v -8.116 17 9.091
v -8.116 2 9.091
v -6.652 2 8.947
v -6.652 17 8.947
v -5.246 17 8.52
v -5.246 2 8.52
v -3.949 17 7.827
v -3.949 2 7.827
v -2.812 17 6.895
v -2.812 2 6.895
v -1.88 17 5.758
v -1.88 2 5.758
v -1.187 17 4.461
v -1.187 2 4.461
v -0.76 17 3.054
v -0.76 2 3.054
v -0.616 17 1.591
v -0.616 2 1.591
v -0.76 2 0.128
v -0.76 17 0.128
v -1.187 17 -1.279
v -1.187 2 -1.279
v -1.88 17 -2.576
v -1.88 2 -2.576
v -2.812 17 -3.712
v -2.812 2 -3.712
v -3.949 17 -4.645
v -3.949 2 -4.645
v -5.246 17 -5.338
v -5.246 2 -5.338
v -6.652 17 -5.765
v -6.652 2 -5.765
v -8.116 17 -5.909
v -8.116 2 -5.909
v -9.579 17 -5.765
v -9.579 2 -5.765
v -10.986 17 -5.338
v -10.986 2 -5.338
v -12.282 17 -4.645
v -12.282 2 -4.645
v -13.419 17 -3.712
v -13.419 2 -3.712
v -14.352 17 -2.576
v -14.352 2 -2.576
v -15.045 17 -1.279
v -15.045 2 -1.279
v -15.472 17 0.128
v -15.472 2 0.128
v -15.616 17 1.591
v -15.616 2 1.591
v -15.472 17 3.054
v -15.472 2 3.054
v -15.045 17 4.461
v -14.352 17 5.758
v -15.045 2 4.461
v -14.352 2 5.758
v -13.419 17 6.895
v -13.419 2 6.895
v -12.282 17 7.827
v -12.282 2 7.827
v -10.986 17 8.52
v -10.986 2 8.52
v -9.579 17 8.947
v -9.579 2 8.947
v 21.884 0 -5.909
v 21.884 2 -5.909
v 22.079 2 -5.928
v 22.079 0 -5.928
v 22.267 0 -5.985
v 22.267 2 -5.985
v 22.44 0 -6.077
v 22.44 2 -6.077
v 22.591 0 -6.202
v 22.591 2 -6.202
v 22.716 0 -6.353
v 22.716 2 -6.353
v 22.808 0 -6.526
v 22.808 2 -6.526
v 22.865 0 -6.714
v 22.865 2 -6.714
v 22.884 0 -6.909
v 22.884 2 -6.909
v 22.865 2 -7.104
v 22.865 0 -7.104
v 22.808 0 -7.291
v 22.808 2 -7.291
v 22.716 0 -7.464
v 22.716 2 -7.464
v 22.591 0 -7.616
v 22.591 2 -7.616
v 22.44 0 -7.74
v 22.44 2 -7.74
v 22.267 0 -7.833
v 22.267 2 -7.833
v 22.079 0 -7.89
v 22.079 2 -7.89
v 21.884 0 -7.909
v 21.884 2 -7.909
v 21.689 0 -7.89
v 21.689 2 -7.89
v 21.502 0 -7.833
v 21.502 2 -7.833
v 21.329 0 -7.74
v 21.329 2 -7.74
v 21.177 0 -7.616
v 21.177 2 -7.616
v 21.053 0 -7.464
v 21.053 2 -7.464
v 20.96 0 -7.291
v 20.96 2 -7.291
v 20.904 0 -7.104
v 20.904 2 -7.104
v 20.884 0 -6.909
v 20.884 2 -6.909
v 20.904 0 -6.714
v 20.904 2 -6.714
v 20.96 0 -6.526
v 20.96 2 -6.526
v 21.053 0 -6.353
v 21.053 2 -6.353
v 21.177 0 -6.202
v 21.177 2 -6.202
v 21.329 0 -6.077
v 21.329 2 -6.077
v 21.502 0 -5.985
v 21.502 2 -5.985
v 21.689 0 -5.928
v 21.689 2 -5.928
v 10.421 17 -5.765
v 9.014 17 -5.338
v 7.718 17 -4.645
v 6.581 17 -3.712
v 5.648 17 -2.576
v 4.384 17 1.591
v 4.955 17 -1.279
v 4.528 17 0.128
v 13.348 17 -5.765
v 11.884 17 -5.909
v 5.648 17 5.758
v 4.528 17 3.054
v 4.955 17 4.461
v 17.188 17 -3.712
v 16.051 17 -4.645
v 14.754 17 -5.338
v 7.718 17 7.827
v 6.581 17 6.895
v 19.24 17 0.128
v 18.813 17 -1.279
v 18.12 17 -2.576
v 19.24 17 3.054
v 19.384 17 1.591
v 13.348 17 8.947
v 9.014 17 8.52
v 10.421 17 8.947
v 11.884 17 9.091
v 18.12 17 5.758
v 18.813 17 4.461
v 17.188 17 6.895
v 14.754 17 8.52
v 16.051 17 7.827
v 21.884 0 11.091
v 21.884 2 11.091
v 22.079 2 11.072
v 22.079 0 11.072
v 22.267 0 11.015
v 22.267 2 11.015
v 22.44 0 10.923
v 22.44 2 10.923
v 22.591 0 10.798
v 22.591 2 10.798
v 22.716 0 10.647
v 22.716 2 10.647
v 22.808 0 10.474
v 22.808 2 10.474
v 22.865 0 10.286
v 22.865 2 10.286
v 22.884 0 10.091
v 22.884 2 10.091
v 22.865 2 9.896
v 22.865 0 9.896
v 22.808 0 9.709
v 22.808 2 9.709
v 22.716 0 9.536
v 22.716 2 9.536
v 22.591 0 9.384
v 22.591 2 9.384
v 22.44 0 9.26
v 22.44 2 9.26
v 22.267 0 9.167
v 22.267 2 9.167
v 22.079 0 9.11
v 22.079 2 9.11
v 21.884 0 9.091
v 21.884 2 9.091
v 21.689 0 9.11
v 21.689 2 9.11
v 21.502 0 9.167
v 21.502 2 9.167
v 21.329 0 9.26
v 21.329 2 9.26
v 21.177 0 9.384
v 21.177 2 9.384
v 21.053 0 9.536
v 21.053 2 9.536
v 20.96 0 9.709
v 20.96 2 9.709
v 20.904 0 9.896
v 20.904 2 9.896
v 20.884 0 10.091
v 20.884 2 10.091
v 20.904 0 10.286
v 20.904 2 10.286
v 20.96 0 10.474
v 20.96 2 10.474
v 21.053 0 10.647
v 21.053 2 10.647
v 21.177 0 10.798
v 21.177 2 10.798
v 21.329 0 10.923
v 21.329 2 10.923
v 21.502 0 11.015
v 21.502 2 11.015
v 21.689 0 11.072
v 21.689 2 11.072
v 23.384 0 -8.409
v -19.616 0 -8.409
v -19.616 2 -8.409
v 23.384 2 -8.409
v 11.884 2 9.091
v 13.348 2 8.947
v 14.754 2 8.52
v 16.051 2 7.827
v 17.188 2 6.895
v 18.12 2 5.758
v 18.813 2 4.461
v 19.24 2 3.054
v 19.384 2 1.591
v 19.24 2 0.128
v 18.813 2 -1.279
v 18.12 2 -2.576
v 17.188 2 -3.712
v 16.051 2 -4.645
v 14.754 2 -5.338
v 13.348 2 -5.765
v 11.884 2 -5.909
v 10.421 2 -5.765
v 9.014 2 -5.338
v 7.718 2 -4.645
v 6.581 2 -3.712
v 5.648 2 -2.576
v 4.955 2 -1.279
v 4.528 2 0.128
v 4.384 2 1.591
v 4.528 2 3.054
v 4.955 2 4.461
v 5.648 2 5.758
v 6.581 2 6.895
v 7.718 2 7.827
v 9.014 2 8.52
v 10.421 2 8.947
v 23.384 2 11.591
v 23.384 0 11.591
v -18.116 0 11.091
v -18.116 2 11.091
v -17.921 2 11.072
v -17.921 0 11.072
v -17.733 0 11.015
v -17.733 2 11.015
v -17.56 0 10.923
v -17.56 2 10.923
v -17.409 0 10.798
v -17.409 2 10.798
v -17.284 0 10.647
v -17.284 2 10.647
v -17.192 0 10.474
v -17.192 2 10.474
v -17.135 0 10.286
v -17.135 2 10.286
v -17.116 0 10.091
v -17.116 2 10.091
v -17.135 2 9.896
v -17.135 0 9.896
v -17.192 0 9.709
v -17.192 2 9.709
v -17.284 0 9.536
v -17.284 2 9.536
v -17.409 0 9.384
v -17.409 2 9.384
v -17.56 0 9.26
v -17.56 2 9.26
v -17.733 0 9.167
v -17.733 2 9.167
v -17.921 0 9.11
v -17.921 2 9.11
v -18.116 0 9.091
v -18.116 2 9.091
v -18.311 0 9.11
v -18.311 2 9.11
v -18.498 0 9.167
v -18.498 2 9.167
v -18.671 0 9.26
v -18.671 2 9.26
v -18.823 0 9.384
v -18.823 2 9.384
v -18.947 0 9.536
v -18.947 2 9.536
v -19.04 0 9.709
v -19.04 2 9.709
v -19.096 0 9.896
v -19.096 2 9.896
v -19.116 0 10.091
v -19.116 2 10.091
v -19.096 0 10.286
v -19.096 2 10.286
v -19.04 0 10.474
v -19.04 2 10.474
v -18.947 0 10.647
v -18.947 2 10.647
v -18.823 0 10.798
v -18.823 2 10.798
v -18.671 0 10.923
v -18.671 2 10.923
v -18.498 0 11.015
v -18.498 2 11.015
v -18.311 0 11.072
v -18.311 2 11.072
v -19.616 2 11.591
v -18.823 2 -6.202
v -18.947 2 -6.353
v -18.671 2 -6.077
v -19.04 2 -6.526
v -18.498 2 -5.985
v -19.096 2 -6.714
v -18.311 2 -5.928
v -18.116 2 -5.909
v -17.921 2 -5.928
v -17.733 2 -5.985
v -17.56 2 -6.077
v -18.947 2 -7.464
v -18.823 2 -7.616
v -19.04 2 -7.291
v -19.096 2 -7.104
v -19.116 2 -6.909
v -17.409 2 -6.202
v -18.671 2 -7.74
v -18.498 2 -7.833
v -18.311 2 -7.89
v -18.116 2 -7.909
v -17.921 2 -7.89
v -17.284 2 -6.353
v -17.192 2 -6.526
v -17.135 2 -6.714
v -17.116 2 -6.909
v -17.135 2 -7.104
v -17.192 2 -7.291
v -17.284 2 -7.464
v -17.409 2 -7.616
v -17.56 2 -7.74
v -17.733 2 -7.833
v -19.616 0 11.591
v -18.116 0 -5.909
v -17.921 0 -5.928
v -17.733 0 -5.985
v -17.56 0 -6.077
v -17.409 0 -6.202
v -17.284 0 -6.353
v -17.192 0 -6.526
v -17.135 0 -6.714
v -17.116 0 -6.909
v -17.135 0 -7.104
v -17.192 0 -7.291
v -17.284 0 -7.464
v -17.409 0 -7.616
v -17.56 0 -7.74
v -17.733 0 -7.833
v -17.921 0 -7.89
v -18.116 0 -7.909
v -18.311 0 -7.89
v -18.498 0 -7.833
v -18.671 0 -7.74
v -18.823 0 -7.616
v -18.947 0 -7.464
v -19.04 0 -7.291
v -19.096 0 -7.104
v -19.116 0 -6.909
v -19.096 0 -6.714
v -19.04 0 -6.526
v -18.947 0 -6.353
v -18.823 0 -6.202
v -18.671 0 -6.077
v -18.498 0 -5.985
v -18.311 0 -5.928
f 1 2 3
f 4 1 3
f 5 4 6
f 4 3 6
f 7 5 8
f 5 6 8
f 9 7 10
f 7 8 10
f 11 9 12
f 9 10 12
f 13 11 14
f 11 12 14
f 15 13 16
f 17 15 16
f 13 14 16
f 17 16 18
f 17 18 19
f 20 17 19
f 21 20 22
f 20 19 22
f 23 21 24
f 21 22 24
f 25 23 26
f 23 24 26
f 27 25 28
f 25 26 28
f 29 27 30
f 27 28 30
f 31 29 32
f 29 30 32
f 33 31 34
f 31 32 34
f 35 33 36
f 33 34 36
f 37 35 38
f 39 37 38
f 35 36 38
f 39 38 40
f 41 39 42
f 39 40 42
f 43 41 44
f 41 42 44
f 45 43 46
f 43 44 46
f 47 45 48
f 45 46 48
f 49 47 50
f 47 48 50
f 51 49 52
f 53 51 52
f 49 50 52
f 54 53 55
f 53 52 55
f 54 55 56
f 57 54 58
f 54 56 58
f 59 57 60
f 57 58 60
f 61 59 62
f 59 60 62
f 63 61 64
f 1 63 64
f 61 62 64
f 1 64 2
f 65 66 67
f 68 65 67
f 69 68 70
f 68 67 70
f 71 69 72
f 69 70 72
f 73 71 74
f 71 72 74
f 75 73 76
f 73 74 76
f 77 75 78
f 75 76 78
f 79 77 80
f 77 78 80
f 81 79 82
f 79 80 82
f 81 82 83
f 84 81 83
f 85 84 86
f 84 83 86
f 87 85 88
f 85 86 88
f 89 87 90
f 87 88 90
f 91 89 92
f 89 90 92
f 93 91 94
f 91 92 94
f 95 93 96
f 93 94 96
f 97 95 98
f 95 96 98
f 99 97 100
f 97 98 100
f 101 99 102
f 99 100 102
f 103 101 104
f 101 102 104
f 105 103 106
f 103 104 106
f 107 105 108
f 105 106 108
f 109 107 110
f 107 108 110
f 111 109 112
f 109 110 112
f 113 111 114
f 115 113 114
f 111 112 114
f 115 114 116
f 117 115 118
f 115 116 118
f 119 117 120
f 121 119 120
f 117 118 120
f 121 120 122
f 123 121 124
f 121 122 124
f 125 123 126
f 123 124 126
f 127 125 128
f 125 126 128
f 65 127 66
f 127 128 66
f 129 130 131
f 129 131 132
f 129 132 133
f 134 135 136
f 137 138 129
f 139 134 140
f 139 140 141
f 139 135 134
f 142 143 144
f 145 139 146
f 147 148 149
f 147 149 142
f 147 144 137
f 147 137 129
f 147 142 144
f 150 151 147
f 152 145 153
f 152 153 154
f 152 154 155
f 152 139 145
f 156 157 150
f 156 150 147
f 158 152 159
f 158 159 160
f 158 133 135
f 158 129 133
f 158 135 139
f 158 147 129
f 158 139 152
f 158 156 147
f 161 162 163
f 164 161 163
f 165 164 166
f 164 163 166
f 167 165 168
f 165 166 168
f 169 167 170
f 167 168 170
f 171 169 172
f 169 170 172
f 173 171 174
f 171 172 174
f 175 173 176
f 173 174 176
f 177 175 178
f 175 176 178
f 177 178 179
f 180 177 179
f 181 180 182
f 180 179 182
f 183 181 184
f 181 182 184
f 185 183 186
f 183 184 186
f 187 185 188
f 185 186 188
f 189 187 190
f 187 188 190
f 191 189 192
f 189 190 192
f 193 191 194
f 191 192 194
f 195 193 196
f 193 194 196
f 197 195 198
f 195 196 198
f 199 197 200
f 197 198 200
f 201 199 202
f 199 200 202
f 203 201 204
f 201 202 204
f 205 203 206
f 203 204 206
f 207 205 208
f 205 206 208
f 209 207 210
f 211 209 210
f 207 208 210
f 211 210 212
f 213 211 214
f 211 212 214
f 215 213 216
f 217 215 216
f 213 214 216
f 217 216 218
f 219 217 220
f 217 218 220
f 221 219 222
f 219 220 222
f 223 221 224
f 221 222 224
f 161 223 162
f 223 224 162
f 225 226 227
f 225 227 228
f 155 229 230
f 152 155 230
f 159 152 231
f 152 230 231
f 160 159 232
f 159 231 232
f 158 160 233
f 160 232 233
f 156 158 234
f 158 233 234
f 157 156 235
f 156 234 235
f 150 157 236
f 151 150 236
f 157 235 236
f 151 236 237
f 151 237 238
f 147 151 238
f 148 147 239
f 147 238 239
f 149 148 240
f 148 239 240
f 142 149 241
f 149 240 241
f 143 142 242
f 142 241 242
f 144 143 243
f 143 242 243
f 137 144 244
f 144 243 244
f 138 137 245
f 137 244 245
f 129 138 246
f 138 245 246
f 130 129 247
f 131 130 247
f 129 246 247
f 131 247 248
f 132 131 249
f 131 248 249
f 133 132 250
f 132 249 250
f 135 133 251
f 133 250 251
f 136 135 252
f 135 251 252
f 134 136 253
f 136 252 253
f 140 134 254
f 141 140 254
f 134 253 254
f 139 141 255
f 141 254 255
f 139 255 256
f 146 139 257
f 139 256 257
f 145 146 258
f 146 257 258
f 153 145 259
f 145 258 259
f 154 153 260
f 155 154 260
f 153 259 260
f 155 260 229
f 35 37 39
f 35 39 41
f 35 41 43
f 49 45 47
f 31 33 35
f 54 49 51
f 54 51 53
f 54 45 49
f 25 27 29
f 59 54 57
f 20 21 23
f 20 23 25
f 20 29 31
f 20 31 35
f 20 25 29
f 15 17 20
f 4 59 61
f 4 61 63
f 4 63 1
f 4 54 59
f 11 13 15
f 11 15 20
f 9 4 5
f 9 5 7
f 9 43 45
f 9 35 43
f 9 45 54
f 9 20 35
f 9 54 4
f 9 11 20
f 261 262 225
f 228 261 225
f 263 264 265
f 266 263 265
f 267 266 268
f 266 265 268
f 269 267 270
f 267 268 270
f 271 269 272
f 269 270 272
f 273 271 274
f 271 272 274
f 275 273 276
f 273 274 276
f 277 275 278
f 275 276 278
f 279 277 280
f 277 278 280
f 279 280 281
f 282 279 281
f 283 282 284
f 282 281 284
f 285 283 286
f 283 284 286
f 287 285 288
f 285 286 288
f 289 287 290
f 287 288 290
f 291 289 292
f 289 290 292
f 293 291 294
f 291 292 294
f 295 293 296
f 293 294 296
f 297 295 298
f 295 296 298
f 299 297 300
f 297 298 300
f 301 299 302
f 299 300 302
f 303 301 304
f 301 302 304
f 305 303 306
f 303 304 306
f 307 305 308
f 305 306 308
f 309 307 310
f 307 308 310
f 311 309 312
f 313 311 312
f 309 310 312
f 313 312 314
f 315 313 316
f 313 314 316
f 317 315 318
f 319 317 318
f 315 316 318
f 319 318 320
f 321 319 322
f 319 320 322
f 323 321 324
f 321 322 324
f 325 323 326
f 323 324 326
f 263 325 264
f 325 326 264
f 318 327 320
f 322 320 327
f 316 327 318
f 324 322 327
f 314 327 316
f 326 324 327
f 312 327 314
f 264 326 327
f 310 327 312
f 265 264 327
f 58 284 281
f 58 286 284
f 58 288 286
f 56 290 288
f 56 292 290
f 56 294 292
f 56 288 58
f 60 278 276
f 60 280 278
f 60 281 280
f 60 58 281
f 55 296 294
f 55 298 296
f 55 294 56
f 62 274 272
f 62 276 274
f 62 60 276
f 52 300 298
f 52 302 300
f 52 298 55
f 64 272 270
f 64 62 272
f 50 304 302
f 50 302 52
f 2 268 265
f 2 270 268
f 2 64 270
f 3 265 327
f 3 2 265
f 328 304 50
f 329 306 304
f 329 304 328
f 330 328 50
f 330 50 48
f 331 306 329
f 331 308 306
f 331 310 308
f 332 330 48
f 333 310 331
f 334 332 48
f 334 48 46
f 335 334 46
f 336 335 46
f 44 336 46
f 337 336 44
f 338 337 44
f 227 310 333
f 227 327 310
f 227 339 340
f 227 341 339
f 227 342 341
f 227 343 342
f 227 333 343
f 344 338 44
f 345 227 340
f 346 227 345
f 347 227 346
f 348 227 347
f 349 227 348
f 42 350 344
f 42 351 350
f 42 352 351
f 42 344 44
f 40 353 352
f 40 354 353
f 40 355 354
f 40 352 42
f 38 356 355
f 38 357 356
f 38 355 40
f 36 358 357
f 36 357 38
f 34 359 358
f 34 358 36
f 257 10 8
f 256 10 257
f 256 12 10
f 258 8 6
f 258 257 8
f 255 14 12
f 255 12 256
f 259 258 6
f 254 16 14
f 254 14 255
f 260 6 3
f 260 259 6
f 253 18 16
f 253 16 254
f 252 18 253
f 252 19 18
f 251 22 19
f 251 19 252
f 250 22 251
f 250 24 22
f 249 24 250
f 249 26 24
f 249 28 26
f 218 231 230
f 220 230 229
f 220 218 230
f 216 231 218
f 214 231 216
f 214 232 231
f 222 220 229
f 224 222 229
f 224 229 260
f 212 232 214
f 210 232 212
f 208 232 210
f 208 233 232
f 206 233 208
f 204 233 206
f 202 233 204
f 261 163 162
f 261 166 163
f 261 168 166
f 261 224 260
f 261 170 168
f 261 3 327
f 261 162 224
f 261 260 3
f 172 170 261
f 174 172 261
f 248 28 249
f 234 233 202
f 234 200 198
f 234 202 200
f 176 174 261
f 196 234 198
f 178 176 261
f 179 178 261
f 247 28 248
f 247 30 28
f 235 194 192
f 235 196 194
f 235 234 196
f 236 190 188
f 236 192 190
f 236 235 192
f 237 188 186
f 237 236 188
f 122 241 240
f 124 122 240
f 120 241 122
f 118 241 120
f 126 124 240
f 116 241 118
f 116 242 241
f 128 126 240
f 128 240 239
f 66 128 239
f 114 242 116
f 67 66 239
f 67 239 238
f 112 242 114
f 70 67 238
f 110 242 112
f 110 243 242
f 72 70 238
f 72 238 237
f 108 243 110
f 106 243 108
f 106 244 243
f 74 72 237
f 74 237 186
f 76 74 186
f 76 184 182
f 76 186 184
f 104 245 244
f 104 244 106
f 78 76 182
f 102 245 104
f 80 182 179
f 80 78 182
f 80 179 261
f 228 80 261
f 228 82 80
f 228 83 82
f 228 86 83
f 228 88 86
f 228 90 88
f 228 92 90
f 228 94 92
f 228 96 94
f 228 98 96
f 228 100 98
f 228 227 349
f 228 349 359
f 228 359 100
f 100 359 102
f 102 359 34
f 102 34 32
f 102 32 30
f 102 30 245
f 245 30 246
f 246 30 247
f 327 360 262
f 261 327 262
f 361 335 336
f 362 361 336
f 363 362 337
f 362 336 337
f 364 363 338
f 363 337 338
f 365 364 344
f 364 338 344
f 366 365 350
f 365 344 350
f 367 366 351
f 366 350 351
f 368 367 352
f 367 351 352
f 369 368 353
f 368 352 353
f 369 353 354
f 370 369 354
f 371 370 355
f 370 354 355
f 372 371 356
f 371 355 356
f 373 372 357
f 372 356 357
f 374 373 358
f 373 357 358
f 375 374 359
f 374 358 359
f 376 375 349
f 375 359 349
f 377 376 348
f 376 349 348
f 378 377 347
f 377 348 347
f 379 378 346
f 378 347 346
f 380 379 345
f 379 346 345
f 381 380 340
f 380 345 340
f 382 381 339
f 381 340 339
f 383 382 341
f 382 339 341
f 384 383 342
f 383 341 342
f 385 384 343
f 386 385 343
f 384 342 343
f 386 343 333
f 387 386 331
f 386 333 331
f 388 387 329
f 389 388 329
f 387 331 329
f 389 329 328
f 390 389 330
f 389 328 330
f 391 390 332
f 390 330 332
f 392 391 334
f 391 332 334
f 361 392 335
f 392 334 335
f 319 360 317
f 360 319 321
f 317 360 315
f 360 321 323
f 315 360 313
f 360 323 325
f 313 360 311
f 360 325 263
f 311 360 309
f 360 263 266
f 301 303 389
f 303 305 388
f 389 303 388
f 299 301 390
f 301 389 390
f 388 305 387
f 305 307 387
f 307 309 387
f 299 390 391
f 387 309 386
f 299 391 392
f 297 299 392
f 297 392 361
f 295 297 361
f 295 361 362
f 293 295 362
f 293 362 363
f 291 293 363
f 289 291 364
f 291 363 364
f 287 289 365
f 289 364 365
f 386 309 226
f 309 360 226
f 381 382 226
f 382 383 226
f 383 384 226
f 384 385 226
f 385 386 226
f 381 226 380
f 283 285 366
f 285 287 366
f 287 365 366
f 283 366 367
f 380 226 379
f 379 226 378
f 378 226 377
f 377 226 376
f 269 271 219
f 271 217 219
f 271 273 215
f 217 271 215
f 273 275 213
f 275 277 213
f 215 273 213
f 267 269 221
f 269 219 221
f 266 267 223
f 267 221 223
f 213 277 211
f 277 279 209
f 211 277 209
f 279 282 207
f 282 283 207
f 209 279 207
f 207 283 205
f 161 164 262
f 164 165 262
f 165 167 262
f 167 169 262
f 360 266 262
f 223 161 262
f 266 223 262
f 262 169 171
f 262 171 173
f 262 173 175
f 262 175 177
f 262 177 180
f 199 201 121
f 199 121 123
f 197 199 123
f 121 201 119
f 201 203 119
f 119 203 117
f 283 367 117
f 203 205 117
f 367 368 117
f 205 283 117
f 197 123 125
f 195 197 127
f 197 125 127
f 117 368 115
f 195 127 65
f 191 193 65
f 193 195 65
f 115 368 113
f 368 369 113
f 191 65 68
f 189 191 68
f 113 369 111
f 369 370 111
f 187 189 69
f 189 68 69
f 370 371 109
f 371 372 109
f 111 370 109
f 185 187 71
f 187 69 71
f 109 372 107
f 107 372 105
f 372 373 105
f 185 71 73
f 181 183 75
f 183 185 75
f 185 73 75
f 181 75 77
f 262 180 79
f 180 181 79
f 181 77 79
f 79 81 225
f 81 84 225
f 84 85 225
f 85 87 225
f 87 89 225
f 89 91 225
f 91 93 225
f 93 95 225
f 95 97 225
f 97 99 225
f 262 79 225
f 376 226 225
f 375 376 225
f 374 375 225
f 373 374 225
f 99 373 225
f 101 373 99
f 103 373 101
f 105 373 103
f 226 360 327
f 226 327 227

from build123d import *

# Parameters (mm, degrees)
SKETCH1_W           = 43
SKETCH1_H           = 20
BOSS_EXTRUDE1_DEPTH = 2
SKETCH2_R           = 1
CUT_EXTRUDE1_DEPTH  = 2
SKETCH3_R           = 7.5
BOSS_EXTRUDE2_DEPTH = 15


with BuildPart() as part:
    # Sketch1 → Boss-Extrude1 (new body)
    with BuildSketch(Plane(origin=(0, 0, 0), x_dir=(1, 0, 0), z_dir=(0, 1, 0))):
        with Locations((1.884331799, -1.591272186)):
            Rectangle(SKETCH1_W, SKETCH1_H)
    extrude(amount=BOSS_EXTRUDE1_DEPTH)

    # Sketch2 → Cut-Extrude1 (cut)
    with BuildSketch(Plane(origin=(0, 2, 0), x_dir=(1, 0, 0), z_dir=(0, 1, 0))):
        with Locations(Location((-18.115668201, -10.091272186, 0), (0, 0, 270))):
            Circle(SKETCH2_R)
        with Locations(Location((21.884331799, -10.091272186, 0), (0, 0, 270))):
            Circle(SKETCH2_R)
        with Locations(Location((-18.115668201, 6.908727814, 0), (0, 0, 270))):
            Circle(SKETCH2_R)
        with Locations(Location((21.884331799, 6.908727814, 0), (0, 0, 270))):
            Circle(SKETCH2_R)
    extrude(amount=-CUT_EXTRUDE1_DEPTH, mode=Mode.SUBTRACT)

    # Sketch3 → Boss-Extrude2 (add)
    with BuildSketch(Plane(origin=(0, 2, 0), x_dir=(1, 0, 0), z_dir=(0, 1, 0))):
        with Locations(Location((11.884331799, -1.591272186, 0), (0, 0, 270))):
            Circle(SKETCH3_R)
        with Locations(Location((-8.115668201, -1.591272186, 0), (0, 0, 270))):
            Circle(SKETCH3_R)
    extrude(amount=BOSS_EXTRUDE2_DEPTH)


solid = part.part
